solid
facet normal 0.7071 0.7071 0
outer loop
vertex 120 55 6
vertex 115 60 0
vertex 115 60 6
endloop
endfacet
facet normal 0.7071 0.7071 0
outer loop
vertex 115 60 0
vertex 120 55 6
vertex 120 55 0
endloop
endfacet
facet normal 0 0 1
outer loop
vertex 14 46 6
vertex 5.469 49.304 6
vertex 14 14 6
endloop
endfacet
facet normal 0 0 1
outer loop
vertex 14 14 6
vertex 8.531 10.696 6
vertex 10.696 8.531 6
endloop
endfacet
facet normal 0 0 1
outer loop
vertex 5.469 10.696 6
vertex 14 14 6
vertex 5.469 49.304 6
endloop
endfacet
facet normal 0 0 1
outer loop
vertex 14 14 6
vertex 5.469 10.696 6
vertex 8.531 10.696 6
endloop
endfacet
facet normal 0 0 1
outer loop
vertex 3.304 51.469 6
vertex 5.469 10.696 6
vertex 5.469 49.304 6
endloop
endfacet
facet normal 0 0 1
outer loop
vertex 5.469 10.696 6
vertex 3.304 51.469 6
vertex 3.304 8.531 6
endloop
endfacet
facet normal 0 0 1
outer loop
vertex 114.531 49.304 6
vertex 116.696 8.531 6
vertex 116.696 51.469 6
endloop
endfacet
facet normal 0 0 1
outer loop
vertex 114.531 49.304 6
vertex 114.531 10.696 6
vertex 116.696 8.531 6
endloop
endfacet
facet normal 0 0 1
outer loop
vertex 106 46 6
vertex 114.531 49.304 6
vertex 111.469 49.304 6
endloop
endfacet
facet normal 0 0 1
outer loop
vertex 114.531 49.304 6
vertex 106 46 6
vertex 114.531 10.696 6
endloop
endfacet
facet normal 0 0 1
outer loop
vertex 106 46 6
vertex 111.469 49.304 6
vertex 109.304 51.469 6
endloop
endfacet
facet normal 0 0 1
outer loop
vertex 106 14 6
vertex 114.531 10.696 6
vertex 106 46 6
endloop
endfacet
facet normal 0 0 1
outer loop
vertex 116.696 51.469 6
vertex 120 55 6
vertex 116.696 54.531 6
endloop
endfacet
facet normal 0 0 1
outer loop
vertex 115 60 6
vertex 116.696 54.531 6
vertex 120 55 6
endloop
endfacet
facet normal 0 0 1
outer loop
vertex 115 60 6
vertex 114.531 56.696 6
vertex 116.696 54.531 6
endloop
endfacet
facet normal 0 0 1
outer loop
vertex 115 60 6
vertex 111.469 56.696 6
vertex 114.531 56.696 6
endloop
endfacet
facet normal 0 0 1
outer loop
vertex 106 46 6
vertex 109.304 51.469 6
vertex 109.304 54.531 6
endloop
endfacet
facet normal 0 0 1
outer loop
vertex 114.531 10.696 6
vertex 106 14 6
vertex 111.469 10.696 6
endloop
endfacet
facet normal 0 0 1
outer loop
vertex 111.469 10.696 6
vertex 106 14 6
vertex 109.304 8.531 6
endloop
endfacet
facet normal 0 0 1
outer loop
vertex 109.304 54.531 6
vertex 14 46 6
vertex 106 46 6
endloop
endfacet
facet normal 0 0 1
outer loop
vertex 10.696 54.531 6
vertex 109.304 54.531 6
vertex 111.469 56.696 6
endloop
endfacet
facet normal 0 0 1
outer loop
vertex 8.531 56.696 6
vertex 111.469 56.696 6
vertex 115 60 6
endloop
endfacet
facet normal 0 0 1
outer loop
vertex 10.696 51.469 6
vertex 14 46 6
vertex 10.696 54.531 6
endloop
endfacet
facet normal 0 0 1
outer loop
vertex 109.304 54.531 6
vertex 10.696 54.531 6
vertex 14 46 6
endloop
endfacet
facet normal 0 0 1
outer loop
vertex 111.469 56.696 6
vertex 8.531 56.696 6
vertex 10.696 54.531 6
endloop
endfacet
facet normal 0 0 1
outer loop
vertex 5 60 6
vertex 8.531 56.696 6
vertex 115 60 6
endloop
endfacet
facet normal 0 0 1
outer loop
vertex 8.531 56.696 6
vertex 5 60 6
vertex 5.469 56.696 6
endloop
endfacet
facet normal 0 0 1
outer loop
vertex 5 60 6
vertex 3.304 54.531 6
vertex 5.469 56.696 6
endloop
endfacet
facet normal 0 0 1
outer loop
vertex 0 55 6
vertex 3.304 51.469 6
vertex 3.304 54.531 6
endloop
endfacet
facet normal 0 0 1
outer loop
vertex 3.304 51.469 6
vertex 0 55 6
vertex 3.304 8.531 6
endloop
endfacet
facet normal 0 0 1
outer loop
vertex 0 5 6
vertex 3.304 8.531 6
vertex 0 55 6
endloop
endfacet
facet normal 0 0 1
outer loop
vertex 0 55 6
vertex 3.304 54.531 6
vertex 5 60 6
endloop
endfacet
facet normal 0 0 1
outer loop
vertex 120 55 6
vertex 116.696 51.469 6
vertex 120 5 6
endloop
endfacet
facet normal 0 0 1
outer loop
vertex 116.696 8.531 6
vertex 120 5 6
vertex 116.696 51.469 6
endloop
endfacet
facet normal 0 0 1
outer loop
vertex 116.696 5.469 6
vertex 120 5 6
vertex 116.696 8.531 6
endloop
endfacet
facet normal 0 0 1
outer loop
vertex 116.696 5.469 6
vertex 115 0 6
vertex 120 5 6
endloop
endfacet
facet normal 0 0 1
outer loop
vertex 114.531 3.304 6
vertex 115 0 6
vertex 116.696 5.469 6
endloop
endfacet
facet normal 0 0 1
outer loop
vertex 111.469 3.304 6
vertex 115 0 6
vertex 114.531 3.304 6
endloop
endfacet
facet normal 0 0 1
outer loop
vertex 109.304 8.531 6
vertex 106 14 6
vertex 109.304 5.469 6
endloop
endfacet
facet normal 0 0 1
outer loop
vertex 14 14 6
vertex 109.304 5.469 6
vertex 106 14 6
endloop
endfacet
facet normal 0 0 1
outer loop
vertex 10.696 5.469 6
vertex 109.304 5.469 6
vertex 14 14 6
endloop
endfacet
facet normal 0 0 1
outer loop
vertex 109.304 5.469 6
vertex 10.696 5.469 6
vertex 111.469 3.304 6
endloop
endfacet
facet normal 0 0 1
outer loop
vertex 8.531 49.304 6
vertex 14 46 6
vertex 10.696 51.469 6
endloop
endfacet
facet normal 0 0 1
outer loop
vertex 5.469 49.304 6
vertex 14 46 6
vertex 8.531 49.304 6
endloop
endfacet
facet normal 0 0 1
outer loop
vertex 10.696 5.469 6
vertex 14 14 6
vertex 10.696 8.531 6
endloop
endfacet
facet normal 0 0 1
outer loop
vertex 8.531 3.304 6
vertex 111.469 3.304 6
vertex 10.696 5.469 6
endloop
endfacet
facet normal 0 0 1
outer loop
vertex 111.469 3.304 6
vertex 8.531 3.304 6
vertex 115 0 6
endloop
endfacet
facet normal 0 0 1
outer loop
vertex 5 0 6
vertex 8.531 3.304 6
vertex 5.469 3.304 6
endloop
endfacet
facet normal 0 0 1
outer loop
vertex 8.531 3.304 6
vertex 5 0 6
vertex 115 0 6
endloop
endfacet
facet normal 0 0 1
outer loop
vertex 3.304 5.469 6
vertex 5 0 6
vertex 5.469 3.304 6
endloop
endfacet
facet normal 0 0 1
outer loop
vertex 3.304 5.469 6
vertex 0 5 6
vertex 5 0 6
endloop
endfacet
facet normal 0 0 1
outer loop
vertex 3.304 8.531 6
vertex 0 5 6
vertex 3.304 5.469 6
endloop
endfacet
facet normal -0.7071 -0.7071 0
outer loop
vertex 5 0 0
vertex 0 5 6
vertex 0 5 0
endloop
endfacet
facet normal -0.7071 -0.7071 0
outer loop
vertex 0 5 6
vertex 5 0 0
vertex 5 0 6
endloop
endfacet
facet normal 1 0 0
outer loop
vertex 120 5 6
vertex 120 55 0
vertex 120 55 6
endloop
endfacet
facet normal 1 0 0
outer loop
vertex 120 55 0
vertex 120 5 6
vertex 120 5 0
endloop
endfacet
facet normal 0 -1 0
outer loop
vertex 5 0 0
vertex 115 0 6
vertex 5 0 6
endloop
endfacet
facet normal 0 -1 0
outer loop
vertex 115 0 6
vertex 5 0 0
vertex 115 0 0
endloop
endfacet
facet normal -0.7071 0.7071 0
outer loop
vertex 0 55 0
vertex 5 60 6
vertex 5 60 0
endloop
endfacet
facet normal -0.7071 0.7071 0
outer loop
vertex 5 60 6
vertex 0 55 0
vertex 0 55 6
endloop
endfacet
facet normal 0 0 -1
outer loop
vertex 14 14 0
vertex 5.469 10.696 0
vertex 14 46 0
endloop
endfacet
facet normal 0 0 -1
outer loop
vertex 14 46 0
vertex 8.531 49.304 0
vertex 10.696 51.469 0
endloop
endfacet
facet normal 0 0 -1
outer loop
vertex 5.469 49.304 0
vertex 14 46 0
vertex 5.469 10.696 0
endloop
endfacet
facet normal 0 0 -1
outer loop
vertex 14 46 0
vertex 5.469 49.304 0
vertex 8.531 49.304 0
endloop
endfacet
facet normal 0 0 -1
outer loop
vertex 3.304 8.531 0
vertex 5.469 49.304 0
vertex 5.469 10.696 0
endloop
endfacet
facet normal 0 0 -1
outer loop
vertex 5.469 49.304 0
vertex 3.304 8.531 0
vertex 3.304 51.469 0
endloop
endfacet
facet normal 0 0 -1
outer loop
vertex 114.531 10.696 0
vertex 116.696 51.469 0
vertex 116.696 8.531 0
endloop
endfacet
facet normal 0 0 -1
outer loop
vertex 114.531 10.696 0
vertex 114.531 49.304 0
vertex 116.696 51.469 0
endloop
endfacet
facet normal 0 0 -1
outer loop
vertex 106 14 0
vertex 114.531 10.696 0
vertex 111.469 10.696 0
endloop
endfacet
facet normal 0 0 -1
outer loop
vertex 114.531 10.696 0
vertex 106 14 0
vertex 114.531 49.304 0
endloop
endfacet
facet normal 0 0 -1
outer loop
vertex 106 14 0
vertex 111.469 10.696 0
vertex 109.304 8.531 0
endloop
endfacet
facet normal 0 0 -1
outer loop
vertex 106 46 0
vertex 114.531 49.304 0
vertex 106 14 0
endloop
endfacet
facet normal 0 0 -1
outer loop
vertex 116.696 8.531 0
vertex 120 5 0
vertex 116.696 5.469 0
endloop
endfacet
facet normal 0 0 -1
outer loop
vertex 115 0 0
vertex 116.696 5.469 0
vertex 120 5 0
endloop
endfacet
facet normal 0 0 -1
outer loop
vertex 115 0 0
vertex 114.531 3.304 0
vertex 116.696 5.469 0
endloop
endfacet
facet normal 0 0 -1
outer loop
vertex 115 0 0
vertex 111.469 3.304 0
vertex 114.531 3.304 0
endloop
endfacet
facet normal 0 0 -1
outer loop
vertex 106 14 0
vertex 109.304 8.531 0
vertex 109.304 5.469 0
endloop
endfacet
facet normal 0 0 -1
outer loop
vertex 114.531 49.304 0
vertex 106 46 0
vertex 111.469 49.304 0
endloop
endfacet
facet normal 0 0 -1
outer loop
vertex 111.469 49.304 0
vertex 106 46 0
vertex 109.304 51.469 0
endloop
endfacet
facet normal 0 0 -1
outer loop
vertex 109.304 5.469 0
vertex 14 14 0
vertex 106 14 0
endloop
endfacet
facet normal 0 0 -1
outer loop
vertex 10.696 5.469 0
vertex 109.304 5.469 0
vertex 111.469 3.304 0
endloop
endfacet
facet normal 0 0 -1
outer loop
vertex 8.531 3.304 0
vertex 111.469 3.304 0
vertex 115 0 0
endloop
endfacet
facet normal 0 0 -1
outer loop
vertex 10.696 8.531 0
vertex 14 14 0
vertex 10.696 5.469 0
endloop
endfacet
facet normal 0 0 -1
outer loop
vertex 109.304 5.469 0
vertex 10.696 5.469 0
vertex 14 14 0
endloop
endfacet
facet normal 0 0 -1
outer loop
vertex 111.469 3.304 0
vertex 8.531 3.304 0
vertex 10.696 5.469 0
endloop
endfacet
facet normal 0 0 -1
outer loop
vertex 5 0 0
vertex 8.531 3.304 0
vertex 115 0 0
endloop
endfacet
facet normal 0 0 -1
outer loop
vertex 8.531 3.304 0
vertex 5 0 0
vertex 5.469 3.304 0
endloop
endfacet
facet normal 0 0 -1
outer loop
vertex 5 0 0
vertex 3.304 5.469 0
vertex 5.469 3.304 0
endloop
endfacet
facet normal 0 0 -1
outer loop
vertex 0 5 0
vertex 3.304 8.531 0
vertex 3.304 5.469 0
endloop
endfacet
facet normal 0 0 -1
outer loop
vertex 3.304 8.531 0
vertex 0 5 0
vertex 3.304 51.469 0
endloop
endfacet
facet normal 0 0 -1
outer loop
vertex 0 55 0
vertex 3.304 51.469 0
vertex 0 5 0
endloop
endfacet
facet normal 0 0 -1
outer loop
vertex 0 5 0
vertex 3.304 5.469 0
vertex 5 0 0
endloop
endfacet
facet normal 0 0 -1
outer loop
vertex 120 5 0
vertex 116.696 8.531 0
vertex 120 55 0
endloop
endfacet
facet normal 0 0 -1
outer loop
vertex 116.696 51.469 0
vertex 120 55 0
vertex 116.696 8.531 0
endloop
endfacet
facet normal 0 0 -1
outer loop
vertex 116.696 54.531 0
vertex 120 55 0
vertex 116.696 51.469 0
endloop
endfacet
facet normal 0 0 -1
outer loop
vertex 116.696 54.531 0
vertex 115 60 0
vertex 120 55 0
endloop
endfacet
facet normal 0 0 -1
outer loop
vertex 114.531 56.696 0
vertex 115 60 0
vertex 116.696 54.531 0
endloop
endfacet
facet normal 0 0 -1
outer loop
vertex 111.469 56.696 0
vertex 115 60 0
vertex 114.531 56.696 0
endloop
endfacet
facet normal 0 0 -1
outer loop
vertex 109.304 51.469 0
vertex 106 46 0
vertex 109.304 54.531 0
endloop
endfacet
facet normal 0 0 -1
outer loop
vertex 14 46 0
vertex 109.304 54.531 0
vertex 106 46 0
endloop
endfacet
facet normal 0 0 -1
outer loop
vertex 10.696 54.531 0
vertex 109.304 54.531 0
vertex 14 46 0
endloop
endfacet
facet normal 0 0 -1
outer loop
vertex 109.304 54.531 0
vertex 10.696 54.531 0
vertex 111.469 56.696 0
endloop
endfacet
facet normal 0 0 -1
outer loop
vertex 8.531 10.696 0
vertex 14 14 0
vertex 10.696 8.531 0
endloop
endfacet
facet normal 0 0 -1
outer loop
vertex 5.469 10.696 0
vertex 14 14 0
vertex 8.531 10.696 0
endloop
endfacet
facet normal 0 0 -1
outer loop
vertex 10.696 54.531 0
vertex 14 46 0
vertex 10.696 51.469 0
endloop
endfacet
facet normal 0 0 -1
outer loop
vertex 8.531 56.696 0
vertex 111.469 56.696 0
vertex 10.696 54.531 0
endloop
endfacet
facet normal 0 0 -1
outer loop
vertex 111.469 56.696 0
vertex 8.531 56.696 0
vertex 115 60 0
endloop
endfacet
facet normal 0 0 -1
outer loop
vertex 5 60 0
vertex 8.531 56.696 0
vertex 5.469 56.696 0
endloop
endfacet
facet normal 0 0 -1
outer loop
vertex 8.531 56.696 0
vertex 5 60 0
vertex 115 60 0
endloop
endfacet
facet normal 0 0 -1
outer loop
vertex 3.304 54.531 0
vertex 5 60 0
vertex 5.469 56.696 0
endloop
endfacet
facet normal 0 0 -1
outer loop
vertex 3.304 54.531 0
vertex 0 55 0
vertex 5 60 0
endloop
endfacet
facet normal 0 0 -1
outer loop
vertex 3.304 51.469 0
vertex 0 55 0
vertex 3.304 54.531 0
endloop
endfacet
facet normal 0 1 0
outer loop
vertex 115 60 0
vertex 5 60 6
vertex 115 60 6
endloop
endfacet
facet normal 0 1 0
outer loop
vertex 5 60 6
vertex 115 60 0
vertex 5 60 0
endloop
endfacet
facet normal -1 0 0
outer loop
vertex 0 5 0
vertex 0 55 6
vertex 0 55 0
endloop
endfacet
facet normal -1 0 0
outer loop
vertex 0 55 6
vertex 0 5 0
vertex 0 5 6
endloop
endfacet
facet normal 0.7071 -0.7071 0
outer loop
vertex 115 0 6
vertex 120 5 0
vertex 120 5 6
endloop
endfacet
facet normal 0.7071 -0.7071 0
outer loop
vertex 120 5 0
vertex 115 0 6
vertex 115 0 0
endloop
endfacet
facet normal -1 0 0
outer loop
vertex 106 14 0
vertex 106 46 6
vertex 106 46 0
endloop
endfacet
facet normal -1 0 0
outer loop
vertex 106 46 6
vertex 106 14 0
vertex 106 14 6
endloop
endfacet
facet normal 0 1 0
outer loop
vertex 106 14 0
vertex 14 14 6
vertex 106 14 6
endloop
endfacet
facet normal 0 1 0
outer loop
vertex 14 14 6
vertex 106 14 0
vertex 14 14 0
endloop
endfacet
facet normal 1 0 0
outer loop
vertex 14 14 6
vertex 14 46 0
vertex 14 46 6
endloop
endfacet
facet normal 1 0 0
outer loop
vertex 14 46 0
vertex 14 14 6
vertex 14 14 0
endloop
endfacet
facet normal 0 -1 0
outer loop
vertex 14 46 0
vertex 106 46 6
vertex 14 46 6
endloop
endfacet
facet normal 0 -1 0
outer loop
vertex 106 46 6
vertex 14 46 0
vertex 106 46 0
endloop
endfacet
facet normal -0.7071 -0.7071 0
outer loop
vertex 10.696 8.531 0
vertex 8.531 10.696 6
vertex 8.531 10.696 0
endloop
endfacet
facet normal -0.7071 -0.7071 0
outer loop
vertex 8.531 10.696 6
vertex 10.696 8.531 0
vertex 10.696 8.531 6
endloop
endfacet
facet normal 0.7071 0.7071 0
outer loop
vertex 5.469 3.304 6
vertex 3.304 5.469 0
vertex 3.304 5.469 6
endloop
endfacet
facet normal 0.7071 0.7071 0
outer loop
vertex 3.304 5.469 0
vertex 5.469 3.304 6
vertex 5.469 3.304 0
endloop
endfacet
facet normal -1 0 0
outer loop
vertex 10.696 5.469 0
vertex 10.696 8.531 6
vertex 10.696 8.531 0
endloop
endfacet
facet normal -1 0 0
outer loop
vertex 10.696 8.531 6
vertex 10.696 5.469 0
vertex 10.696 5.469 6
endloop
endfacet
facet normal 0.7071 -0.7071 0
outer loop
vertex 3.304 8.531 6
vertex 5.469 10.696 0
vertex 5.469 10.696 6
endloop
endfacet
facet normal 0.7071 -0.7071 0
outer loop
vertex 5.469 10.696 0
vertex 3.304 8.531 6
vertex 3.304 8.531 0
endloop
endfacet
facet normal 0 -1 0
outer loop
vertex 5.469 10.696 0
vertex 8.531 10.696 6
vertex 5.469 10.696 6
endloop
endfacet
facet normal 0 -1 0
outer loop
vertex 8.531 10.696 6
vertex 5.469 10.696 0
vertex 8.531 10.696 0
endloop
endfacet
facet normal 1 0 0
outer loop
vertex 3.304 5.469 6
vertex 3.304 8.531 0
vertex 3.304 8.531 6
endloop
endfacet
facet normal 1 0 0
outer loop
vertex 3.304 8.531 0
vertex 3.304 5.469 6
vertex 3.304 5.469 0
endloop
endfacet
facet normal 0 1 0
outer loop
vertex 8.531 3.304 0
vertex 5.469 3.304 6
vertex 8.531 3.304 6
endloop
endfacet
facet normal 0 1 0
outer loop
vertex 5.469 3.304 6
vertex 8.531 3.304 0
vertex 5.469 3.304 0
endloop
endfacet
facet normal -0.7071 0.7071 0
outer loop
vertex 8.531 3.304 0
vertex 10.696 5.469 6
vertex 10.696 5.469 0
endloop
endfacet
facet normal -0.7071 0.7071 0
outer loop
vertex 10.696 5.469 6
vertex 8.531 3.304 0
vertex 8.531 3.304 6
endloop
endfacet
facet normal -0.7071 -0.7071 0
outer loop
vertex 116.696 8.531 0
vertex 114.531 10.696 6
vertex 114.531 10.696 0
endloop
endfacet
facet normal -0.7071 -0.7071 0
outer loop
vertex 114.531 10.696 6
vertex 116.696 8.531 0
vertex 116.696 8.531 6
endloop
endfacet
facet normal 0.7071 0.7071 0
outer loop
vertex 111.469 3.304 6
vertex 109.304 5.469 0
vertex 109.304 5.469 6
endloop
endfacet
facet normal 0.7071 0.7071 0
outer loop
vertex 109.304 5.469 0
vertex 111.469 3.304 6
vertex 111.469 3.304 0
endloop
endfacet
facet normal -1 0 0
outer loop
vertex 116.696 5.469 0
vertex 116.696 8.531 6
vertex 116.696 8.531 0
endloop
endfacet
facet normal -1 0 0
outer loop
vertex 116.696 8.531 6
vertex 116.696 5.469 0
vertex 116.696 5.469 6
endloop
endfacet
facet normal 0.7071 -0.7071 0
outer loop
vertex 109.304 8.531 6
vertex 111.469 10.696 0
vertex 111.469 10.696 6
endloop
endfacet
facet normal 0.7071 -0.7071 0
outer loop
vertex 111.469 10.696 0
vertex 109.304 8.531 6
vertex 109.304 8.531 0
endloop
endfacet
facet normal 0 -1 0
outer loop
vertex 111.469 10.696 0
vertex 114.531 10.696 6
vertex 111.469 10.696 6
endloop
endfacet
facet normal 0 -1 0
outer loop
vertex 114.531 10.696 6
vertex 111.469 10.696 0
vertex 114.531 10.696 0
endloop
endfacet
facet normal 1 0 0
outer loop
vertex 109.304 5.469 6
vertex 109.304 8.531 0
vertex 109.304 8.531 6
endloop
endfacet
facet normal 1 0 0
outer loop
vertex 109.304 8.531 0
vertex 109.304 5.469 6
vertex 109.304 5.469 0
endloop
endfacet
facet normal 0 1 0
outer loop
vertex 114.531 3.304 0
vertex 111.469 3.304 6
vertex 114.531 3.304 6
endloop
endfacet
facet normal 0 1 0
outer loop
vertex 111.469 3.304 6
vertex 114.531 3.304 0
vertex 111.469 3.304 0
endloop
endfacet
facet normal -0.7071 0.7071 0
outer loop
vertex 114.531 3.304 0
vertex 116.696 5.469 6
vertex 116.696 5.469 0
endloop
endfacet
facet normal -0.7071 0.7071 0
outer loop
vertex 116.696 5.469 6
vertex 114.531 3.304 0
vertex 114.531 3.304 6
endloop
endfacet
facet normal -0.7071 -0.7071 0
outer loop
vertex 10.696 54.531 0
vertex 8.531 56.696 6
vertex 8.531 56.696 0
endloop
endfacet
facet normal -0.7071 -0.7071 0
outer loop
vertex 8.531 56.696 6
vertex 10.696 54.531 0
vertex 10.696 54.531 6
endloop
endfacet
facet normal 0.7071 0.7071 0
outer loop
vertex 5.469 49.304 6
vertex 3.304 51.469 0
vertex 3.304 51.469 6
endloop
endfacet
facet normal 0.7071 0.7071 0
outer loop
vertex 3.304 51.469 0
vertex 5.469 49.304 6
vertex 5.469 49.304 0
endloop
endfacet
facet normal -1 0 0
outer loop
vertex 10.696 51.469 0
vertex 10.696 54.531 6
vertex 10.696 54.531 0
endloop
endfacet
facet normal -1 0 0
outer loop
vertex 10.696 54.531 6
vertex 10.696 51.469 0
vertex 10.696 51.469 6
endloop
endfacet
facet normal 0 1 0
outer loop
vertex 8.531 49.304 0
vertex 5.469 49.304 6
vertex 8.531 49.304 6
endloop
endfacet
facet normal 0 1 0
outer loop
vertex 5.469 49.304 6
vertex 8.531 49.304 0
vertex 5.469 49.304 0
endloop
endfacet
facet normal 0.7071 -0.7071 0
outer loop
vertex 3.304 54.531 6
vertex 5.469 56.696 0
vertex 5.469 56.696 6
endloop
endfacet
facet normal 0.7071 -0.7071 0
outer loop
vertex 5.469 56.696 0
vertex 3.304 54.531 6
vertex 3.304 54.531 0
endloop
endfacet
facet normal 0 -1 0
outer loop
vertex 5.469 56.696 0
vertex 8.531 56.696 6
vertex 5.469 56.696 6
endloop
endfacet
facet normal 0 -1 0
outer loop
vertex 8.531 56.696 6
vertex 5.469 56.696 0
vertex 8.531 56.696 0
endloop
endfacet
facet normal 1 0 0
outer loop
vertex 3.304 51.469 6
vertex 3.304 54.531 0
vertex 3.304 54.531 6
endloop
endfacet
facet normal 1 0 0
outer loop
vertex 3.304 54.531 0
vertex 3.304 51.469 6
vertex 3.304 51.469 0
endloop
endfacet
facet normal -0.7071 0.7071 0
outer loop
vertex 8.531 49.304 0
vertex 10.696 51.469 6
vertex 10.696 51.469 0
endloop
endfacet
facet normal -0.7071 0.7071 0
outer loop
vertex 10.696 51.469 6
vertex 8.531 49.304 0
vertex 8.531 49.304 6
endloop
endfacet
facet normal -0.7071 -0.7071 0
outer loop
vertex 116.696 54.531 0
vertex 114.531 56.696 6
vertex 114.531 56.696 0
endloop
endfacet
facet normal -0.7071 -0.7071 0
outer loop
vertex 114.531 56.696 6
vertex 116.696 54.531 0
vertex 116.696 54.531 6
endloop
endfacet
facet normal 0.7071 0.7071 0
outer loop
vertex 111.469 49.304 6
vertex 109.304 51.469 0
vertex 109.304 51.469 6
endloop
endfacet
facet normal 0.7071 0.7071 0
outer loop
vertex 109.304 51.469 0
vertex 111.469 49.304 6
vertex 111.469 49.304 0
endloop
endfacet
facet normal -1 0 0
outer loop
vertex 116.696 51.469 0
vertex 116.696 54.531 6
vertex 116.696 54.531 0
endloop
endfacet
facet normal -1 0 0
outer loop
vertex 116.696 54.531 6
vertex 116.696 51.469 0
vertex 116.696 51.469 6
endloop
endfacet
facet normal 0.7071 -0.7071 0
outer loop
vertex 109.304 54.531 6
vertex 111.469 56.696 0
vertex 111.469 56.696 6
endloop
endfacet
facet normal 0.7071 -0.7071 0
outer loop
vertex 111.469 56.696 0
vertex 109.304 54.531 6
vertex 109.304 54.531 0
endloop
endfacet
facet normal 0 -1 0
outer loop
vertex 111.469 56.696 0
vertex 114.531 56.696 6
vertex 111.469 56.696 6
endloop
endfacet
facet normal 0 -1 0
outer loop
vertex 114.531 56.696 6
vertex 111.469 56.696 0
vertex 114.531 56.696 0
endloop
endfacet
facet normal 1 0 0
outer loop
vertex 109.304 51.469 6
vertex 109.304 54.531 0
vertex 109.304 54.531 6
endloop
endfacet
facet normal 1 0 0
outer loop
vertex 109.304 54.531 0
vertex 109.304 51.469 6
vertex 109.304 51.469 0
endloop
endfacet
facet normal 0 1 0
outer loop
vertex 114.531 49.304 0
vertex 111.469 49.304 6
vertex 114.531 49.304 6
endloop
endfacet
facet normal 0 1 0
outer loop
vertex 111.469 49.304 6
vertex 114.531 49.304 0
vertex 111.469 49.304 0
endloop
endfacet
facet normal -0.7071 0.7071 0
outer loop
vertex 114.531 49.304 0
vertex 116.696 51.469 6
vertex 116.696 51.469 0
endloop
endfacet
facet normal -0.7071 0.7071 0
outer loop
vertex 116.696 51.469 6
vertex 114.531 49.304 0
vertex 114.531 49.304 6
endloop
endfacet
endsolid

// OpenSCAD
$fn = 32;

// ----------------------------------------------------------------------
// Frame plate: 120 x 60 frame, 14 mm rails
// ----------------------------------------------------------------------

// --- parameters (mm) ---
plate_l = 120;            // plate length, X
plate_w = 60;             // plate width, Y
plate_t = 6;              // plate thickness, Z (extrusion height)
corner_c = 5;             // corner chamfer
frame_bar = 14;           // frame rail width
bolt_r = 4;               // corner bolt window radius
bolt_inset = 7;           // bolt centre inset from the edges

win_l = plate_l - 2 * frame_bar;  // window length
win_w = plate_w - 2 * frame_bar;  // window width
bolt_d = 2 * bolt_r;  // corner hole diameter

profile = [[5, 0], [115, 0], [120, 5], [120, 55], [115, 60], [5, 60], [0, 55], [0, 5]];  // primary outline, 8 points, counter clockwise
void_1 = [[14, 14], [106, 14], [106, 46], [14, 46]];  // the window, 4 points
void_2 = [[10.696, 8.531], [8.531, 10.696], [5.469, 10.696], [3.304, 8.531], [3.304, 5.469], [5.469, 3.304], [8.531, 3.304], [10.696, 5.469]];  // corner bolt window, 8 points
void_3 = [[116.696, 8.531], [114.531, 10.696], [111.469, 10.696], [109.304, 8.531], [109.304, 5.469], [111.469, 3.304], [114.531, 3.304], [116.696, 5.469]];  // corner bolt window, 8 points
void_4 = [[10.696, 54.531], [8.531, 56.696], [5.469, 56.696], [3.304, 54.531], [3.304, 51.469], [5.469, 49.304], [8.531, 49.304], [10.696, 51.469]];  // corner bolt window, 8 points
void_5 = [[116.696, 54.531], [114.531, 56.696], [111.469, 56.696], [109.304, 54.531], [109.304, 51.469], [111.469, 49.304], [114.531, 49.304], [116.696, 51.469]];  // corner bolt window, 8 points

// --- the one profile operation ---
difference() {
  linear_extrude(height = plate_t) polygon(points = profile);
  translate([0, 0, -1])
    linear_extrude(height = plate_t + 2) polygon(points = void_1);
  translate([0, 0, -1])
    linear_extrude(height = plate_t + 2) polygon(points = void_2);
  translate([0, 0, -1])
    linear_extrude(height = plate_t + 2) polygon(points = void_3);
  translate([0, 0, -1])
    linear_extrude(height = plate_t + 2) polygon(points = void_4);
  translate([0, 0, -1])
    linear_extrude(height = plate_t + 2) polygon(points = void_5);
}
